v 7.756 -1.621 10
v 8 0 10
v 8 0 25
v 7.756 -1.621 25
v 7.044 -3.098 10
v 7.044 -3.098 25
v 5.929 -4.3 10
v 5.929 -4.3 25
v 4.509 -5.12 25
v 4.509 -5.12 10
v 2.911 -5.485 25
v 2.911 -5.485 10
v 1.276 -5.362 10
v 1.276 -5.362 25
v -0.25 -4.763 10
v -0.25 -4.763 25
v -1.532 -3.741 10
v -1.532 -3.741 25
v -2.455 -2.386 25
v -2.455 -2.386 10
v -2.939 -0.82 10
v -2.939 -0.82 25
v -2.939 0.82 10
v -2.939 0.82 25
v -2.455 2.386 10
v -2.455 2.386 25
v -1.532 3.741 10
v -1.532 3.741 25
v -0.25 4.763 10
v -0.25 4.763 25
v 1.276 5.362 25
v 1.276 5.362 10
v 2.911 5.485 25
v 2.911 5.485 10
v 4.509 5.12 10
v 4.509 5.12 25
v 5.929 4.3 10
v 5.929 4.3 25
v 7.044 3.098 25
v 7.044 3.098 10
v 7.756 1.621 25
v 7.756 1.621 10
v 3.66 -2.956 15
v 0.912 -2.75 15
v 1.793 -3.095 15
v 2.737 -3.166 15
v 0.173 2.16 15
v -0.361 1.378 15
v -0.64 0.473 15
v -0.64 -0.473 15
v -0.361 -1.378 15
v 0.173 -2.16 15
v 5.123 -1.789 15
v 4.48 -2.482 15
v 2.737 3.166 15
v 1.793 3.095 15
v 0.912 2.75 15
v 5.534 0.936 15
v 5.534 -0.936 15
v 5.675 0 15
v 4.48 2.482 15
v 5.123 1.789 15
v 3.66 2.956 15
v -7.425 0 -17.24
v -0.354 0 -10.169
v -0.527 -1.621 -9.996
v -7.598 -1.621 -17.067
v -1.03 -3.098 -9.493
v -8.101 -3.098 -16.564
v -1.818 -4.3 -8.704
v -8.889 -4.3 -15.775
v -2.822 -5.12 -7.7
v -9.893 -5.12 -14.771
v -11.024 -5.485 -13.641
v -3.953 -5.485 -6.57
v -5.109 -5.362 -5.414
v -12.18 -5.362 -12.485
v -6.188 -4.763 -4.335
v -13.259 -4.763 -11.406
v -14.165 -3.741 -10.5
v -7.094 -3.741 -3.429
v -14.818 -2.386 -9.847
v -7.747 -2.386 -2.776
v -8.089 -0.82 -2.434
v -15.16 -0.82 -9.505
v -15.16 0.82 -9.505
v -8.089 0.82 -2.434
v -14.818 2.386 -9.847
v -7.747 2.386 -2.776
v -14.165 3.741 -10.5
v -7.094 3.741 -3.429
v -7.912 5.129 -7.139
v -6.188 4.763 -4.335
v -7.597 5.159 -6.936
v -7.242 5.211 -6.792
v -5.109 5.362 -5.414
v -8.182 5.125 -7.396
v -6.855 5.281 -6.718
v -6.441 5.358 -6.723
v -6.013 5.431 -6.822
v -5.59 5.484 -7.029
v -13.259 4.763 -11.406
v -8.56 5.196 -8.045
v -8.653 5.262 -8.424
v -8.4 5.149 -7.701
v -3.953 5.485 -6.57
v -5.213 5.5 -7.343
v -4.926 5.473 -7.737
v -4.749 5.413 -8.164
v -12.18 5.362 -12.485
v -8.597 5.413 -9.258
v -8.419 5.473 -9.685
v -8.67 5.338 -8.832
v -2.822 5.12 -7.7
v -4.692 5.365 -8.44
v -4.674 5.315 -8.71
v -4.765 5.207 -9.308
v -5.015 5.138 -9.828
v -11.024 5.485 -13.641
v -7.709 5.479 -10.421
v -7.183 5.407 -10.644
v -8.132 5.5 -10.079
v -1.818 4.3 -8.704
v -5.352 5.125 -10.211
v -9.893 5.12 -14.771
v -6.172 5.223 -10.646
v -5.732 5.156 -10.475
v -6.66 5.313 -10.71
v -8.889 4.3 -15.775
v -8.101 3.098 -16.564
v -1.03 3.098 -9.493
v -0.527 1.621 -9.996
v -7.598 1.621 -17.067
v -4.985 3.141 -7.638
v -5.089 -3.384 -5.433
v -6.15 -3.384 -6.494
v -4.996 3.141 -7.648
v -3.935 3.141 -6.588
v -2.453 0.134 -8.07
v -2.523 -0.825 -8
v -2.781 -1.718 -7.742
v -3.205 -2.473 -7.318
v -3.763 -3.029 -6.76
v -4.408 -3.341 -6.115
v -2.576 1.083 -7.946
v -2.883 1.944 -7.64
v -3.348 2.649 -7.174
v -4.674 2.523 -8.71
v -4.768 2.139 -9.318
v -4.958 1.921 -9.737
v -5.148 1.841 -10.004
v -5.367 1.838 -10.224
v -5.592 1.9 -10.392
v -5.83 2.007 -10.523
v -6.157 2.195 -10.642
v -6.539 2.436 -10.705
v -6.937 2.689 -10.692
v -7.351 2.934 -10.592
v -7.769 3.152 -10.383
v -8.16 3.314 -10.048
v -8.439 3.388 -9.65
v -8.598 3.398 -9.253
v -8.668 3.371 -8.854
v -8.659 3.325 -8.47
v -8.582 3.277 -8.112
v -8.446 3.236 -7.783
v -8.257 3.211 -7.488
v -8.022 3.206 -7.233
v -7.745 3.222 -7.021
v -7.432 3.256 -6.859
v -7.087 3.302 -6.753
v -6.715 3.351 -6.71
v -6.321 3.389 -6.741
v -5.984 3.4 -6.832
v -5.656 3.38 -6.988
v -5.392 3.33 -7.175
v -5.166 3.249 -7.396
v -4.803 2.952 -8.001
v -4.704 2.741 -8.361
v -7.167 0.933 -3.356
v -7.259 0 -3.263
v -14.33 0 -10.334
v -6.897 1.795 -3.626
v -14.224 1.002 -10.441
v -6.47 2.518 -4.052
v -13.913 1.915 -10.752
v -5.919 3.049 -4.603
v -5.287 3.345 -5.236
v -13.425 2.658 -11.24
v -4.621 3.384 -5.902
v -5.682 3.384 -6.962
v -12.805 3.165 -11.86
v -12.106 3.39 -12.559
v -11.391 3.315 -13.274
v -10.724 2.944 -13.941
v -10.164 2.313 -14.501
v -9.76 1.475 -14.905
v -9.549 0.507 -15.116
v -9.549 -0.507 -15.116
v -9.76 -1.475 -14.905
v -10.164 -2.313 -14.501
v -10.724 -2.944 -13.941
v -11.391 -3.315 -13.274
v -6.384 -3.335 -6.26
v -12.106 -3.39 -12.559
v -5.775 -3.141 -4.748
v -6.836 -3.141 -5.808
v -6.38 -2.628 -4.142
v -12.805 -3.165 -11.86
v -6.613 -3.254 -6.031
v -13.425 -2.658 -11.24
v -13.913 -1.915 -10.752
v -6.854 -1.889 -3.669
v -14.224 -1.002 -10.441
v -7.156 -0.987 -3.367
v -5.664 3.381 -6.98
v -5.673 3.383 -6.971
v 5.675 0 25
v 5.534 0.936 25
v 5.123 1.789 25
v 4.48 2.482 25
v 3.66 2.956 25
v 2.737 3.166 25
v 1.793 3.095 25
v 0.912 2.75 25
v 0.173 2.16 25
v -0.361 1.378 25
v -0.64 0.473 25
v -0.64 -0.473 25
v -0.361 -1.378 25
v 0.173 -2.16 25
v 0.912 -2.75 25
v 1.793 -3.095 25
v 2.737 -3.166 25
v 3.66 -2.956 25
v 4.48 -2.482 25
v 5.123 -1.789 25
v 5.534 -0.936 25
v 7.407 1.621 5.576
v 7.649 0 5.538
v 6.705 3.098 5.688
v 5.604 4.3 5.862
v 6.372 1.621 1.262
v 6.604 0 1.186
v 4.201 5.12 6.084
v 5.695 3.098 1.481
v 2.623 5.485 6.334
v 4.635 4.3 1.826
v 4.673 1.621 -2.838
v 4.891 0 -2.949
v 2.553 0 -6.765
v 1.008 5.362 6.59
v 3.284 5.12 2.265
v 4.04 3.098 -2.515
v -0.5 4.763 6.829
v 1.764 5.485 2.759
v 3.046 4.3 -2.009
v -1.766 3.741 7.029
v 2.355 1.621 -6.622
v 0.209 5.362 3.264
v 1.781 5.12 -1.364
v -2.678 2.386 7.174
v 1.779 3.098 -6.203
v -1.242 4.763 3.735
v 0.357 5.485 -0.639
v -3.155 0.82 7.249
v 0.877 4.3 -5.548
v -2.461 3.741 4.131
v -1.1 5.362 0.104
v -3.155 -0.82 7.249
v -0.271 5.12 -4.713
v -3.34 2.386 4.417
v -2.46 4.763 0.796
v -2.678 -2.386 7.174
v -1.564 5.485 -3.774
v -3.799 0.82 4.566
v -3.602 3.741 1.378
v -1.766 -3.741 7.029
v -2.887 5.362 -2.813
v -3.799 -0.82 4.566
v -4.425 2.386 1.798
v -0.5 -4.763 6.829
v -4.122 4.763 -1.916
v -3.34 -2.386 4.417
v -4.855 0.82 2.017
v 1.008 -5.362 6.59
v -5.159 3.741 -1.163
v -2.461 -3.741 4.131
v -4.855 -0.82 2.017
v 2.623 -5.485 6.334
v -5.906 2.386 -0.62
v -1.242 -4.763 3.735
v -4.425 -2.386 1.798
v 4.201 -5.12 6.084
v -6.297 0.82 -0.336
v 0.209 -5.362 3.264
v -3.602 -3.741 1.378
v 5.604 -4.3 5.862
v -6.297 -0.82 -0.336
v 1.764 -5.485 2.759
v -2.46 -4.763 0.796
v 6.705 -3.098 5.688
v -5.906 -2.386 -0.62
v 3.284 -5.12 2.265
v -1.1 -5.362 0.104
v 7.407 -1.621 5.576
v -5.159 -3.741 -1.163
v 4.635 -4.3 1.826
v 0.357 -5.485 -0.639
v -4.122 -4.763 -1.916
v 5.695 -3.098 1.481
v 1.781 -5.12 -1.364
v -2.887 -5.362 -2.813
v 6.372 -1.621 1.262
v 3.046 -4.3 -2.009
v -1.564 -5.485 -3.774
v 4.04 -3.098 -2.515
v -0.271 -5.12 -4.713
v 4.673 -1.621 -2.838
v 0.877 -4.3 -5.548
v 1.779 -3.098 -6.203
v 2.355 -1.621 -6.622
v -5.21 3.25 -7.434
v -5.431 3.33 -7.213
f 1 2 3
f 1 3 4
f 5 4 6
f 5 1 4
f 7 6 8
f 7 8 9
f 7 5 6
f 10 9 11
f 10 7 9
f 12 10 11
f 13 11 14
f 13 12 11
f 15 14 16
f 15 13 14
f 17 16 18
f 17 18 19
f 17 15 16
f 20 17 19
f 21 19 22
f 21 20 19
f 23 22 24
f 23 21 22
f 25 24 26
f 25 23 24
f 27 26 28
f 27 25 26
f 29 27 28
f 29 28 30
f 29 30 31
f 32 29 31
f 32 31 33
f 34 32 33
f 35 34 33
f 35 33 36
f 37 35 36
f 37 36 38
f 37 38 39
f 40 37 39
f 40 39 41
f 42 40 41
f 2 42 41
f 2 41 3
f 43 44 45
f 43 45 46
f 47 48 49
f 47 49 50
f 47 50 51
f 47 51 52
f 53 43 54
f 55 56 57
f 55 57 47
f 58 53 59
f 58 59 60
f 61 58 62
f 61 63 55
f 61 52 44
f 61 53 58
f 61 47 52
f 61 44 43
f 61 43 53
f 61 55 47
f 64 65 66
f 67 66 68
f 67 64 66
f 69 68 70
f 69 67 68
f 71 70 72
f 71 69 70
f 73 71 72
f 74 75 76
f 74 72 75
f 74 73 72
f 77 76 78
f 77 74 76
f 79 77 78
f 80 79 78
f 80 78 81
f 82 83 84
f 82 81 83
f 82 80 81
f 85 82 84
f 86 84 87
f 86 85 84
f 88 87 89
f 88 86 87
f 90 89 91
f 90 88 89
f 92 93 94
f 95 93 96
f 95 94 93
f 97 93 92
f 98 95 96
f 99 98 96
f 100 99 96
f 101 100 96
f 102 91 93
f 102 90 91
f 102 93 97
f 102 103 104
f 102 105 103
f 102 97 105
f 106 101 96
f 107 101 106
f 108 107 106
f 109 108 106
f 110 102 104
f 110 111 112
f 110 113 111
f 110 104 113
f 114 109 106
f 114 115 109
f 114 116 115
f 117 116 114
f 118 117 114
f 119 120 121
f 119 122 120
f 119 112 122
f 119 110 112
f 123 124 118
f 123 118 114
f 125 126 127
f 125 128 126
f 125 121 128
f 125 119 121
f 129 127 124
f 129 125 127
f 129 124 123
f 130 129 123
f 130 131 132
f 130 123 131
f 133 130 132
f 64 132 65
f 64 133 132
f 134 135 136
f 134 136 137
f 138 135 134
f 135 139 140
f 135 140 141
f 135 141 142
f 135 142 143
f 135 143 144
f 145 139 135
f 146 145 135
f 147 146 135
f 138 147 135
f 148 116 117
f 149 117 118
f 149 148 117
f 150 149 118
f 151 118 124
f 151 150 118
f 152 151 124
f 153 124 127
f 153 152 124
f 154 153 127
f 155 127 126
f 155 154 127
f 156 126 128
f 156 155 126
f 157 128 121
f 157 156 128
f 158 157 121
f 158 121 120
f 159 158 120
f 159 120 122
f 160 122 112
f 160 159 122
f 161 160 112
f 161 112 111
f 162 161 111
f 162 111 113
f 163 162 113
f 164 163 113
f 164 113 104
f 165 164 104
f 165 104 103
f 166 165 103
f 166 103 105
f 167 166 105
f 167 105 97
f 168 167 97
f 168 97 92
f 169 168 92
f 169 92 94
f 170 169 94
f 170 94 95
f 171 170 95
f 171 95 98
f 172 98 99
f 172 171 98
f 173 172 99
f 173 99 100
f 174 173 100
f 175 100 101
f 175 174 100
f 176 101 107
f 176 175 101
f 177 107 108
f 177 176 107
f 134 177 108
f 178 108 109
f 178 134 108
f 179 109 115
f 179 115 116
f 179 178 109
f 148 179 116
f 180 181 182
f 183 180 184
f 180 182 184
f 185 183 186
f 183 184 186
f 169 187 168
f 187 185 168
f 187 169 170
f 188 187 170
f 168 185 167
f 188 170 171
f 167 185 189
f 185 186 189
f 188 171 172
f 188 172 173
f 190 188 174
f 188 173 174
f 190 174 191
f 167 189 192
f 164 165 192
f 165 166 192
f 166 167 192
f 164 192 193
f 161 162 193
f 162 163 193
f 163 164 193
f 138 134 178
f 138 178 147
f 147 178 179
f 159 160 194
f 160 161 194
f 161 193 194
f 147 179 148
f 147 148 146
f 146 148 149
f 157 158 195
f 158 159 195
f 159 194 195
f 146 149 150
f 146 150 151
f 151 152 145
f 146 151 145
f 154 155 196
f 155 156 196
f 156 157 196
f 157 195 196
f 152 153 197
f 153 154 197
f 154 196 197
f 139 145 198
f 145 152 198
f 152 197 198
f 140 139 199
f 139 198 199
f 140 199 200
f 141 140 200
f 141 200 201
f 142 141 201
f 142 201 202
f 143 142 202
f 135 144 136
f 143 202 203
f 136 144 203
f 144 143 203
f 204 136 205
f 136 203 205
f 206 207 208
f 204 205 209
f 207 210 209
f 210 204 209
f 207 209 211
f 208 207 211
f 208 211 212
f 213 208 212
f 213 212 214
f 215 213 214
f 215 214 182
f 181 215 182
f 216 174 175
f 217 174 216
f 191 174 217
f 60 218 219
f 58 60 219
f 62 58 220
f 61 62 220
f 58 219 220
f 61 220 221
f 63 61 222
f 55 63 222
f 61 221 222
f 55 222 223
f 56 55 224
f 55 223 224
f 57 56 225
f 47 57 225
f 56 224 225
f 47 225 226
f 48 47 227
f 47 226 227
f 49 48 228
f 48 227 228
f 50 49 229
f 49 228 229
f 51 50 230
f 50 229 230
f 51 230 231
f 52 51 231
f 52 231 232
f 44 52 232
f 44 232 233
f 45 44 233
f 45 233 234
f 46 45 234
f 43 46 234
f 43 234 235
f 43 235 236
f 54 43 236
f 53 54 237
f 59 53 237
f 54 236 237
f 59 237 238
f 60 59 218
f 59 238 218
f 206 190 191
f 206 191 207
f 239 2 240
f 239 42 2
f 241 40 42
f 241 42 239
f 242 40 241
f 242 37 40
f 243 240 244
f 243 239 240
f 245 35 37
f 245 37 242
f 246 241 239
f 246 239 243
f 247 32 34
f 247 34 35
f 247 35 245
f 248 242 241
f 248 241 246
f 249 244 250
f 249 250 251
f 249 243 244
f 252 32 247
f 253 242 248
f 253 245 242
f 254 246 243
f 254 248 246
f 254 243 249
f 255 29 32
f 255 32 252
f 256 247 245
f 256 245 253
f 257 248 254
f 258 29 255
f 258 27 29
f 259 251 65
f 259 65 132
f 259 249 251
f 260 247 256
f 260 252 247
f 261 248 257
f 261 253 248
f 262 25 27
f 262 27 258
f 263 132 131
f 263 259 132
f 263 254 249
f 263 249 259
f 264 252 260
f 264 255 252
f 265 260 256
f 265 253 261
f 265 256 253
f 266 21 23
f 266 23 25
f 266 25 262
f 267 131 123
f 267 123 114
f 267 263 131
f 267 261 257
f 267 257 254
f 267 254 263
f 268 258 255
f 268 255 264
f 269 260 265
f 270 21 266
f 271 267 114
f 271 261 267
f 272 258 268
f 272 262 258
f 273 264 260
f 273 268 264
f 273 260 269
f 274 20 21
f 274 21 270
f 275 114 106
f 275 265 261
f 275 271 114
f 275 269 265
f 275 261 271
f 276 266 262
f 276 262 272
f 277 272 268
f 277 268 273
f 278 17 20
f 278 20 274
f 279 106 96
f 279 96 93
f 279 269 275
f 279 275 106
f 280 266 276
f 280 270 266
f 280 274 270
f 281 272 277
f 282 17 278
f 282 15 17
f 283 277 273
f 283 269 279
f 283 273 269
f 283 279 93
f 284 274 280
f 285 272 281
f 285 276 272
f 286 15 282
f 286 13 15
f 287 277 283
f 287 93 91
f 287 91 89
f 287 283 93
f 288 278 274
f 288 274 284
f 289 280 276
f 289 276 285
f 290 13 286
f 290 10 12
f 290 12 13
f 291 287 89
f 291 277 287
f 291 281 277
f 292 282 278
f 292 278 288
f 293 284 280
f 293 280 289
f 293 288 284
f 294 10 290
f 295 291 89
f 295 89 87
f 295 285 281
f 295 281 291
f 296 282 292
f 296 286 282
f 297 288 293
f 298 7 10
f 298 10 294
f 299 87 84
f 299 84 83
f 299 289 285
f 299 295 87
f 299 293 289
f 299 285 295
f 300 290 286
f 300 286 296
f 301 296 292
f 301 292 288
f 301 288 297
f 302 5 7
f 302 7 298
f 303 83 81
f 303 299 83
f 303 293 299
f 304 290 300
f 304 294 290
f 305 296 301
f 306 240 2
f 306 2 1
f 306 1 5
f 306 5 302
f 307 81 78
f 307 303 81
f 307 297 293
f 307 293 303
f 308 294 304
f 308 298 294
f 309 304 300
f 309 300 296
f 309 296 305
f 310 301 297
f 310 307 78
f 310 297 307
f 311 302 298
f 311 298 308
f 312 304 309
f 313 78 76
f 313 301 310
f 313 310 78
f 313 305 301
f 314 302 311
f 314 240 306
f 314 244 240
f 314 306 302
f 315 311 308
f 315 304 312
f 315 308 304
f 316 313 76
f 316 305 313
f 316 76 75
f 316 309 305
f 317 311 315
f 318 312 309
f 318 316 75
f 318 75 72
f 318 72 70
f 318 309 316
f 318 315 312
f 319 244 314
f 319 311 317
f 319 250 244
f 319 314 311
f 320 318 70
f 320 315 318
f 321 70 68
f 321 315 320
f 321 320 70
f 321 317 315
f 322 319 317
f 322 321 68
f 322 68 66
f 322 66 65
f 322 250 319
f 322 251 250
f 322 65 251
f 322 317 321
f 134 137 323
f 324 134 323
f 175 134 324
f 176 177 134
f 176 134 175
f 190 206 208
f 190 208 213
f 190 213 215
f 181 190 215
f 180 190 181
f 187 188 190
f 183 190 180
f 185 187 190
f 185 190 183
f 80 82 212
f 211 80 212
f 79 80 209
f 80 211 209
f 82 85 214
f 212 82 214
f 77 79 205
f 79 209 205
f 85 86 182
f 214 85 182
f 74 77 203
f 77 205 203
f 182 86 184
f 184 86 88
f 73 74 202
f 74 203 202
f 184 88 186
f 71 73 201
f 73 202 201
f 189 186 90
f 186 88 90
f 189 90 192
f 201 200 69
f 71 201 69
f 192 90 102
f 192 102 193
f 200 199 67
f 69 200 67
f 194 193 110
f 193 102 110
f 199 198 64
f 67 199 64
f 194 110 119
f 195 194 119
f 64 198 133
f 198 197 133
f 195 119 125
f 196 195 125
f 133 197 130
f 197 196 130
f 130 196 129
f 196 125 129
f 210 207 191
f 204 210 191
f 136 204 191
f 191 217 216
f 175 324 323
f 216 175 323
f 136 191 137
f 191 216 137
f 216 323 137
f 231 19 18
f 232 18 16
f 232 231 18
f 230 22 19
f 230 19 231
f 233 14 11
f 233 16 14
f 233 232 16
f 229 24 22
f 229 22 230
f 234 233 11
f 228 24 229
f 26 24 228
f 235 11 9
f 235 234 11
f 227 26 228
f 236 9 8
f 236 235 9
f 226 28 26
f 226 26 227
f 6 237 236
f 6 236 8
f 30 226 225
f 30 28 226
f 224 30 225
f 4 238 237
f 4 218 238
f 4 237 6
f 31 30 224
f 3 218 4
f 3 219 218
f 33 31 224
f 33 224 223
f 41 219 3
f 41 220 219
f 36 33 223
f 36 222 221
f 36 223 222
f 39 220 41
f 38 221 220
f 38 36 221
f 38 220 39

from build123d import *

# Parameters (mm, degrees)
SKETCH4_R           = 5.5
SKETCH6_R           = 3.175
HOLE_SHAFT_DEPTH    = 10
SKETCH7_R           = 3.4
HOLE_POT_DEPTH      = 10
SKETCH8_R           = 2
HOLE_INSERT_DEPTH   = 6.5000001
BOSS_EXTRUDE3_DEPTH = 1.5


with BuildPart() as part:
    # Sweep2: sweep along a path in PROFILE
    with BuildLine(Plane(origin=(0, 0, 0), x_dir=(1, 0, 0), z_dir=(0, 1, 0))) as sweep2_path:
        Line((2.5, -25), (2.5, -10))
        ThreePointArc((2.5, -10), (0.747502348, -1.189599343), (-4.243188728, 6.27949768))
        Line((-4.243188728, 6.27949768), (-11.31425654, 13.350565492))
    # Sketch4 → Sweep2 (sweep)
    with BuildSketch(Plane.XY.offset(25)):
        with Locations((2.5, 0)):
            Circle(SKETCH4_R)
    sweep(path=sweep2_path.line)

    # Sketch6 → HOLE_SHAFT (cut)
    with BuildSketch(Plane.XY.offset(25)):
        with Locations((2.5, 0)):
            Circle(SKETCH6_R)
    extrude(amount=-HOLE_SHAFT_DEPTH, mode=Mode.SUBTRACT)

    # Sketch7 → HOLE_POT (cut)
    with BuildSketch(Plane(origin=(-12.332411016, 0, -12.332411016), x_dir=(-0.707106781, 0, 0.707106781), z_dir=(-0.707106781, 0, -0.707106781))):
        with Locations((-0.57444604, 0)):
            Circle(SKETCH7_R)
    extrude(amount=-HOLE_POT_DEPTH, mode=Mode.SUBTRACT)

    # Sketch8 → HOLE_INSERT (cut, through all)
    with BuildSketch(Plane(origin=(0, 0, 0), x_dir=(1, 0, 0), z_dir=(0, 1, 0))):
        with Locations((-6.673561157, 8.709870109)):
            Circle(SKETCH8_R)
    extrude(amount=HOLE_INSERT_DEPTH, mode=Mode.SUBTRACT)

    # Sketch11 → Boss-Extrude3 (add)
    with BuildSketch(Plane(origin=(-5.261343204, 0, -5.261343204), x_dir=(-0.707106781, 0, 0.707106781), z_dir=(-0.707106781, 0, -0.707106781))):
        with BuildLine():
            Line((-0.905457853, 3.383848575), (0.72667763, -3.141190411))
            ThreePointArc((0.72667763, -3.141190411), (0.250591719, -3.298380314), (-0.243434227, -3.383848575))
            Line((-0.243434227, -3.383848575), (-1.87556971, 3.141190411))
            ThreePointArc((-1.87556971, 3.141190411), (-1.3994838, 3.298380314), (-0.905457853, 3.383848575))
        make_face()
    extrude(amount=BOSS_EXTRUDE3_DEPTH)


solid = part.part
